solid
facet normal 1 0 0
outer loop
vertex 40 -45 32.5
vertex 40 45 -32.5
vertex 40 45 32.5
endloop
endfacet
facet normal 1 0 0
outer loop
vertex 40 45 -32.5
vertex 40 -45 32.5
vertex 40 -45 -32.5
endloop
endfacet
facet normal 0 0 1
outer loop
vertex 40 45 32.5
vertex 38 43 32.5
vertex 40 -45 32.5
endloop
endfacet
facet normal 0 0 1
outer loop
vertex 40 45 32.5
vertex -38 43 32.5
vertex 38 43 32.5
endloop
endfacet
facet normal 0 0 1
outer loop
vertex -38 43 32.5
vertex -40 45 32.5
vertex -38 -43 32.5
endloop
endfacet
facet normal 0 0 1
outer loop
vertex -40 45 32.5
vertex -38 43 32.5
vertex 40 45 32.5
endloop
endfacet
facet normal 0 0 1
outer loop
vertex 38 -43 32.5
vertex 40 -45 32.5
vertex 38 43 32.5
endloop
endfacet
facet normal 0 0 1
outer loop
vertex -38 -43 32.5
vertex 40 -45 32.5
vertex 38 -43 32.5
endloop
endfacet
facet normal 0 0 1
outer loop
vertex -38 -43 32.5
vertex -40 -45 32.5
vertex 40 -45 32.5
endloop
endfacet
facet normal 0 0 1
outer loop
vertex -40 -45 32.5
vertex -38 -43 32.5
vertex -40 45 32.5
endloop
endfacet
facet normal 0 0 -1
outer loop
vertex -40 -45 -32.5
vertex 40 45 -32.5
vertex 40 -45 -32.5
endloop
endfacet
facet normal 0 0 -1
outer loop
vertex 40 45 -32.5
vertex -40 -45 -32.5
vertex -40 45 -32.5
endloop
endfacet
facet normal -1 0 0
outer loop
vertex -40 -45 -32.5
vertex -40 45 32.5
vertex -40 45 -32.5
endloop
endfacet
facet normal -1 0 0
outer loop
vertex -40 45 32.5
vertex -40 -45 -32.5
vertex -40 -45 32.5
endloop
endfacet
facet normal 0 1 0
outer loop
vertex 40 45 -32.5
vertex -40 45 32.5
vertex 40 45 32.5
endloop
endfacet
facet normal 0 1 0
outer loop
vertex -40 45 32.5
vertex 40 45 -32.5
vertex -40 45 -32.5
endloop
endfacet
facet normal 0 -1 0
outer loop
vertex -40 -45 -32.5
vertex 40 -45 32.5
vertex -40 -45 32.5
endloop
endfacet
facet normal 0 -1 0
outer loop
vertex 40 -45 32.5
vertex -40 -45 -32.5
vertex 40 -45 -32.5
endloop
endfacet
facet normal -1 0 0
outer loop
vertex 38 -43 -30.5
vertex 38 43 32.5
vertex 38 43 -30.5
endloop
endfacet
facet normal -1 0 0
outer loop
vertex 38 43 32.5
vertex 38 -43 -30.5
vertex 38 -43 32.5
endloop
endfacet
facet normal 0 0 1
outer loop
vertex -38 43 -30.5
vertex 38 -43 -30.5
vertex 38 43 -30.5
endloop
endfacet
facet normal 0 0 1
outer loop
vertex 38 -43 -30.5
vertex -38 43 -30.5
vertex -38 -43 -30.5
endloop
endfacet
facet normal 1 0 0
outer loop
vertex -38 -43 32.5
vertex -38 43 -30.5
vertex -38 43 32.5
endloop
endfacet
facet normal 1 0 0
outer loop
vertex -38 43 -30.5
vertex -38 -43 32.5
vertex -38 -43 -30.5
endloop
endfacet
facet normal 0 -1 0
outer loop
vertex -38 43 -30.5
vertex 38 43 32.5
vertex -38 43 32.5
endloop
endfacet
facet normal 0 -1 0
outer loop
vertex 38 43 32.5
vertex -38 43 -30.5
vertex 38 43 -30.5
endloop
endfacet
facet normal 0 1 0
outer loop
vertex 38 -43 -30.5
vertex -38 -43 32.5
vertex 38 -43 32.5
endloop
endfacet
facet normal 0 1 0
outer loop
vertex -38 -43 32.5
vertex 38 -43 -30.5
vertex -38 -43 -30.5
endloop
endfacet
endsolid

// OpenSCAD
// ========================================
// a 80 x 90 x 65 mm enclosure with 2 mm wall thickness
// NeuroCAD canonical IR; dimensions are millimetres
// ========================================
$fn = 48;

difference() {
  cube(size=[80, 90, 65], center=true);
  translate([0, 0, 1.1]) {
    cube(size=[76, 86, 63.2], center=true);
  }
}
